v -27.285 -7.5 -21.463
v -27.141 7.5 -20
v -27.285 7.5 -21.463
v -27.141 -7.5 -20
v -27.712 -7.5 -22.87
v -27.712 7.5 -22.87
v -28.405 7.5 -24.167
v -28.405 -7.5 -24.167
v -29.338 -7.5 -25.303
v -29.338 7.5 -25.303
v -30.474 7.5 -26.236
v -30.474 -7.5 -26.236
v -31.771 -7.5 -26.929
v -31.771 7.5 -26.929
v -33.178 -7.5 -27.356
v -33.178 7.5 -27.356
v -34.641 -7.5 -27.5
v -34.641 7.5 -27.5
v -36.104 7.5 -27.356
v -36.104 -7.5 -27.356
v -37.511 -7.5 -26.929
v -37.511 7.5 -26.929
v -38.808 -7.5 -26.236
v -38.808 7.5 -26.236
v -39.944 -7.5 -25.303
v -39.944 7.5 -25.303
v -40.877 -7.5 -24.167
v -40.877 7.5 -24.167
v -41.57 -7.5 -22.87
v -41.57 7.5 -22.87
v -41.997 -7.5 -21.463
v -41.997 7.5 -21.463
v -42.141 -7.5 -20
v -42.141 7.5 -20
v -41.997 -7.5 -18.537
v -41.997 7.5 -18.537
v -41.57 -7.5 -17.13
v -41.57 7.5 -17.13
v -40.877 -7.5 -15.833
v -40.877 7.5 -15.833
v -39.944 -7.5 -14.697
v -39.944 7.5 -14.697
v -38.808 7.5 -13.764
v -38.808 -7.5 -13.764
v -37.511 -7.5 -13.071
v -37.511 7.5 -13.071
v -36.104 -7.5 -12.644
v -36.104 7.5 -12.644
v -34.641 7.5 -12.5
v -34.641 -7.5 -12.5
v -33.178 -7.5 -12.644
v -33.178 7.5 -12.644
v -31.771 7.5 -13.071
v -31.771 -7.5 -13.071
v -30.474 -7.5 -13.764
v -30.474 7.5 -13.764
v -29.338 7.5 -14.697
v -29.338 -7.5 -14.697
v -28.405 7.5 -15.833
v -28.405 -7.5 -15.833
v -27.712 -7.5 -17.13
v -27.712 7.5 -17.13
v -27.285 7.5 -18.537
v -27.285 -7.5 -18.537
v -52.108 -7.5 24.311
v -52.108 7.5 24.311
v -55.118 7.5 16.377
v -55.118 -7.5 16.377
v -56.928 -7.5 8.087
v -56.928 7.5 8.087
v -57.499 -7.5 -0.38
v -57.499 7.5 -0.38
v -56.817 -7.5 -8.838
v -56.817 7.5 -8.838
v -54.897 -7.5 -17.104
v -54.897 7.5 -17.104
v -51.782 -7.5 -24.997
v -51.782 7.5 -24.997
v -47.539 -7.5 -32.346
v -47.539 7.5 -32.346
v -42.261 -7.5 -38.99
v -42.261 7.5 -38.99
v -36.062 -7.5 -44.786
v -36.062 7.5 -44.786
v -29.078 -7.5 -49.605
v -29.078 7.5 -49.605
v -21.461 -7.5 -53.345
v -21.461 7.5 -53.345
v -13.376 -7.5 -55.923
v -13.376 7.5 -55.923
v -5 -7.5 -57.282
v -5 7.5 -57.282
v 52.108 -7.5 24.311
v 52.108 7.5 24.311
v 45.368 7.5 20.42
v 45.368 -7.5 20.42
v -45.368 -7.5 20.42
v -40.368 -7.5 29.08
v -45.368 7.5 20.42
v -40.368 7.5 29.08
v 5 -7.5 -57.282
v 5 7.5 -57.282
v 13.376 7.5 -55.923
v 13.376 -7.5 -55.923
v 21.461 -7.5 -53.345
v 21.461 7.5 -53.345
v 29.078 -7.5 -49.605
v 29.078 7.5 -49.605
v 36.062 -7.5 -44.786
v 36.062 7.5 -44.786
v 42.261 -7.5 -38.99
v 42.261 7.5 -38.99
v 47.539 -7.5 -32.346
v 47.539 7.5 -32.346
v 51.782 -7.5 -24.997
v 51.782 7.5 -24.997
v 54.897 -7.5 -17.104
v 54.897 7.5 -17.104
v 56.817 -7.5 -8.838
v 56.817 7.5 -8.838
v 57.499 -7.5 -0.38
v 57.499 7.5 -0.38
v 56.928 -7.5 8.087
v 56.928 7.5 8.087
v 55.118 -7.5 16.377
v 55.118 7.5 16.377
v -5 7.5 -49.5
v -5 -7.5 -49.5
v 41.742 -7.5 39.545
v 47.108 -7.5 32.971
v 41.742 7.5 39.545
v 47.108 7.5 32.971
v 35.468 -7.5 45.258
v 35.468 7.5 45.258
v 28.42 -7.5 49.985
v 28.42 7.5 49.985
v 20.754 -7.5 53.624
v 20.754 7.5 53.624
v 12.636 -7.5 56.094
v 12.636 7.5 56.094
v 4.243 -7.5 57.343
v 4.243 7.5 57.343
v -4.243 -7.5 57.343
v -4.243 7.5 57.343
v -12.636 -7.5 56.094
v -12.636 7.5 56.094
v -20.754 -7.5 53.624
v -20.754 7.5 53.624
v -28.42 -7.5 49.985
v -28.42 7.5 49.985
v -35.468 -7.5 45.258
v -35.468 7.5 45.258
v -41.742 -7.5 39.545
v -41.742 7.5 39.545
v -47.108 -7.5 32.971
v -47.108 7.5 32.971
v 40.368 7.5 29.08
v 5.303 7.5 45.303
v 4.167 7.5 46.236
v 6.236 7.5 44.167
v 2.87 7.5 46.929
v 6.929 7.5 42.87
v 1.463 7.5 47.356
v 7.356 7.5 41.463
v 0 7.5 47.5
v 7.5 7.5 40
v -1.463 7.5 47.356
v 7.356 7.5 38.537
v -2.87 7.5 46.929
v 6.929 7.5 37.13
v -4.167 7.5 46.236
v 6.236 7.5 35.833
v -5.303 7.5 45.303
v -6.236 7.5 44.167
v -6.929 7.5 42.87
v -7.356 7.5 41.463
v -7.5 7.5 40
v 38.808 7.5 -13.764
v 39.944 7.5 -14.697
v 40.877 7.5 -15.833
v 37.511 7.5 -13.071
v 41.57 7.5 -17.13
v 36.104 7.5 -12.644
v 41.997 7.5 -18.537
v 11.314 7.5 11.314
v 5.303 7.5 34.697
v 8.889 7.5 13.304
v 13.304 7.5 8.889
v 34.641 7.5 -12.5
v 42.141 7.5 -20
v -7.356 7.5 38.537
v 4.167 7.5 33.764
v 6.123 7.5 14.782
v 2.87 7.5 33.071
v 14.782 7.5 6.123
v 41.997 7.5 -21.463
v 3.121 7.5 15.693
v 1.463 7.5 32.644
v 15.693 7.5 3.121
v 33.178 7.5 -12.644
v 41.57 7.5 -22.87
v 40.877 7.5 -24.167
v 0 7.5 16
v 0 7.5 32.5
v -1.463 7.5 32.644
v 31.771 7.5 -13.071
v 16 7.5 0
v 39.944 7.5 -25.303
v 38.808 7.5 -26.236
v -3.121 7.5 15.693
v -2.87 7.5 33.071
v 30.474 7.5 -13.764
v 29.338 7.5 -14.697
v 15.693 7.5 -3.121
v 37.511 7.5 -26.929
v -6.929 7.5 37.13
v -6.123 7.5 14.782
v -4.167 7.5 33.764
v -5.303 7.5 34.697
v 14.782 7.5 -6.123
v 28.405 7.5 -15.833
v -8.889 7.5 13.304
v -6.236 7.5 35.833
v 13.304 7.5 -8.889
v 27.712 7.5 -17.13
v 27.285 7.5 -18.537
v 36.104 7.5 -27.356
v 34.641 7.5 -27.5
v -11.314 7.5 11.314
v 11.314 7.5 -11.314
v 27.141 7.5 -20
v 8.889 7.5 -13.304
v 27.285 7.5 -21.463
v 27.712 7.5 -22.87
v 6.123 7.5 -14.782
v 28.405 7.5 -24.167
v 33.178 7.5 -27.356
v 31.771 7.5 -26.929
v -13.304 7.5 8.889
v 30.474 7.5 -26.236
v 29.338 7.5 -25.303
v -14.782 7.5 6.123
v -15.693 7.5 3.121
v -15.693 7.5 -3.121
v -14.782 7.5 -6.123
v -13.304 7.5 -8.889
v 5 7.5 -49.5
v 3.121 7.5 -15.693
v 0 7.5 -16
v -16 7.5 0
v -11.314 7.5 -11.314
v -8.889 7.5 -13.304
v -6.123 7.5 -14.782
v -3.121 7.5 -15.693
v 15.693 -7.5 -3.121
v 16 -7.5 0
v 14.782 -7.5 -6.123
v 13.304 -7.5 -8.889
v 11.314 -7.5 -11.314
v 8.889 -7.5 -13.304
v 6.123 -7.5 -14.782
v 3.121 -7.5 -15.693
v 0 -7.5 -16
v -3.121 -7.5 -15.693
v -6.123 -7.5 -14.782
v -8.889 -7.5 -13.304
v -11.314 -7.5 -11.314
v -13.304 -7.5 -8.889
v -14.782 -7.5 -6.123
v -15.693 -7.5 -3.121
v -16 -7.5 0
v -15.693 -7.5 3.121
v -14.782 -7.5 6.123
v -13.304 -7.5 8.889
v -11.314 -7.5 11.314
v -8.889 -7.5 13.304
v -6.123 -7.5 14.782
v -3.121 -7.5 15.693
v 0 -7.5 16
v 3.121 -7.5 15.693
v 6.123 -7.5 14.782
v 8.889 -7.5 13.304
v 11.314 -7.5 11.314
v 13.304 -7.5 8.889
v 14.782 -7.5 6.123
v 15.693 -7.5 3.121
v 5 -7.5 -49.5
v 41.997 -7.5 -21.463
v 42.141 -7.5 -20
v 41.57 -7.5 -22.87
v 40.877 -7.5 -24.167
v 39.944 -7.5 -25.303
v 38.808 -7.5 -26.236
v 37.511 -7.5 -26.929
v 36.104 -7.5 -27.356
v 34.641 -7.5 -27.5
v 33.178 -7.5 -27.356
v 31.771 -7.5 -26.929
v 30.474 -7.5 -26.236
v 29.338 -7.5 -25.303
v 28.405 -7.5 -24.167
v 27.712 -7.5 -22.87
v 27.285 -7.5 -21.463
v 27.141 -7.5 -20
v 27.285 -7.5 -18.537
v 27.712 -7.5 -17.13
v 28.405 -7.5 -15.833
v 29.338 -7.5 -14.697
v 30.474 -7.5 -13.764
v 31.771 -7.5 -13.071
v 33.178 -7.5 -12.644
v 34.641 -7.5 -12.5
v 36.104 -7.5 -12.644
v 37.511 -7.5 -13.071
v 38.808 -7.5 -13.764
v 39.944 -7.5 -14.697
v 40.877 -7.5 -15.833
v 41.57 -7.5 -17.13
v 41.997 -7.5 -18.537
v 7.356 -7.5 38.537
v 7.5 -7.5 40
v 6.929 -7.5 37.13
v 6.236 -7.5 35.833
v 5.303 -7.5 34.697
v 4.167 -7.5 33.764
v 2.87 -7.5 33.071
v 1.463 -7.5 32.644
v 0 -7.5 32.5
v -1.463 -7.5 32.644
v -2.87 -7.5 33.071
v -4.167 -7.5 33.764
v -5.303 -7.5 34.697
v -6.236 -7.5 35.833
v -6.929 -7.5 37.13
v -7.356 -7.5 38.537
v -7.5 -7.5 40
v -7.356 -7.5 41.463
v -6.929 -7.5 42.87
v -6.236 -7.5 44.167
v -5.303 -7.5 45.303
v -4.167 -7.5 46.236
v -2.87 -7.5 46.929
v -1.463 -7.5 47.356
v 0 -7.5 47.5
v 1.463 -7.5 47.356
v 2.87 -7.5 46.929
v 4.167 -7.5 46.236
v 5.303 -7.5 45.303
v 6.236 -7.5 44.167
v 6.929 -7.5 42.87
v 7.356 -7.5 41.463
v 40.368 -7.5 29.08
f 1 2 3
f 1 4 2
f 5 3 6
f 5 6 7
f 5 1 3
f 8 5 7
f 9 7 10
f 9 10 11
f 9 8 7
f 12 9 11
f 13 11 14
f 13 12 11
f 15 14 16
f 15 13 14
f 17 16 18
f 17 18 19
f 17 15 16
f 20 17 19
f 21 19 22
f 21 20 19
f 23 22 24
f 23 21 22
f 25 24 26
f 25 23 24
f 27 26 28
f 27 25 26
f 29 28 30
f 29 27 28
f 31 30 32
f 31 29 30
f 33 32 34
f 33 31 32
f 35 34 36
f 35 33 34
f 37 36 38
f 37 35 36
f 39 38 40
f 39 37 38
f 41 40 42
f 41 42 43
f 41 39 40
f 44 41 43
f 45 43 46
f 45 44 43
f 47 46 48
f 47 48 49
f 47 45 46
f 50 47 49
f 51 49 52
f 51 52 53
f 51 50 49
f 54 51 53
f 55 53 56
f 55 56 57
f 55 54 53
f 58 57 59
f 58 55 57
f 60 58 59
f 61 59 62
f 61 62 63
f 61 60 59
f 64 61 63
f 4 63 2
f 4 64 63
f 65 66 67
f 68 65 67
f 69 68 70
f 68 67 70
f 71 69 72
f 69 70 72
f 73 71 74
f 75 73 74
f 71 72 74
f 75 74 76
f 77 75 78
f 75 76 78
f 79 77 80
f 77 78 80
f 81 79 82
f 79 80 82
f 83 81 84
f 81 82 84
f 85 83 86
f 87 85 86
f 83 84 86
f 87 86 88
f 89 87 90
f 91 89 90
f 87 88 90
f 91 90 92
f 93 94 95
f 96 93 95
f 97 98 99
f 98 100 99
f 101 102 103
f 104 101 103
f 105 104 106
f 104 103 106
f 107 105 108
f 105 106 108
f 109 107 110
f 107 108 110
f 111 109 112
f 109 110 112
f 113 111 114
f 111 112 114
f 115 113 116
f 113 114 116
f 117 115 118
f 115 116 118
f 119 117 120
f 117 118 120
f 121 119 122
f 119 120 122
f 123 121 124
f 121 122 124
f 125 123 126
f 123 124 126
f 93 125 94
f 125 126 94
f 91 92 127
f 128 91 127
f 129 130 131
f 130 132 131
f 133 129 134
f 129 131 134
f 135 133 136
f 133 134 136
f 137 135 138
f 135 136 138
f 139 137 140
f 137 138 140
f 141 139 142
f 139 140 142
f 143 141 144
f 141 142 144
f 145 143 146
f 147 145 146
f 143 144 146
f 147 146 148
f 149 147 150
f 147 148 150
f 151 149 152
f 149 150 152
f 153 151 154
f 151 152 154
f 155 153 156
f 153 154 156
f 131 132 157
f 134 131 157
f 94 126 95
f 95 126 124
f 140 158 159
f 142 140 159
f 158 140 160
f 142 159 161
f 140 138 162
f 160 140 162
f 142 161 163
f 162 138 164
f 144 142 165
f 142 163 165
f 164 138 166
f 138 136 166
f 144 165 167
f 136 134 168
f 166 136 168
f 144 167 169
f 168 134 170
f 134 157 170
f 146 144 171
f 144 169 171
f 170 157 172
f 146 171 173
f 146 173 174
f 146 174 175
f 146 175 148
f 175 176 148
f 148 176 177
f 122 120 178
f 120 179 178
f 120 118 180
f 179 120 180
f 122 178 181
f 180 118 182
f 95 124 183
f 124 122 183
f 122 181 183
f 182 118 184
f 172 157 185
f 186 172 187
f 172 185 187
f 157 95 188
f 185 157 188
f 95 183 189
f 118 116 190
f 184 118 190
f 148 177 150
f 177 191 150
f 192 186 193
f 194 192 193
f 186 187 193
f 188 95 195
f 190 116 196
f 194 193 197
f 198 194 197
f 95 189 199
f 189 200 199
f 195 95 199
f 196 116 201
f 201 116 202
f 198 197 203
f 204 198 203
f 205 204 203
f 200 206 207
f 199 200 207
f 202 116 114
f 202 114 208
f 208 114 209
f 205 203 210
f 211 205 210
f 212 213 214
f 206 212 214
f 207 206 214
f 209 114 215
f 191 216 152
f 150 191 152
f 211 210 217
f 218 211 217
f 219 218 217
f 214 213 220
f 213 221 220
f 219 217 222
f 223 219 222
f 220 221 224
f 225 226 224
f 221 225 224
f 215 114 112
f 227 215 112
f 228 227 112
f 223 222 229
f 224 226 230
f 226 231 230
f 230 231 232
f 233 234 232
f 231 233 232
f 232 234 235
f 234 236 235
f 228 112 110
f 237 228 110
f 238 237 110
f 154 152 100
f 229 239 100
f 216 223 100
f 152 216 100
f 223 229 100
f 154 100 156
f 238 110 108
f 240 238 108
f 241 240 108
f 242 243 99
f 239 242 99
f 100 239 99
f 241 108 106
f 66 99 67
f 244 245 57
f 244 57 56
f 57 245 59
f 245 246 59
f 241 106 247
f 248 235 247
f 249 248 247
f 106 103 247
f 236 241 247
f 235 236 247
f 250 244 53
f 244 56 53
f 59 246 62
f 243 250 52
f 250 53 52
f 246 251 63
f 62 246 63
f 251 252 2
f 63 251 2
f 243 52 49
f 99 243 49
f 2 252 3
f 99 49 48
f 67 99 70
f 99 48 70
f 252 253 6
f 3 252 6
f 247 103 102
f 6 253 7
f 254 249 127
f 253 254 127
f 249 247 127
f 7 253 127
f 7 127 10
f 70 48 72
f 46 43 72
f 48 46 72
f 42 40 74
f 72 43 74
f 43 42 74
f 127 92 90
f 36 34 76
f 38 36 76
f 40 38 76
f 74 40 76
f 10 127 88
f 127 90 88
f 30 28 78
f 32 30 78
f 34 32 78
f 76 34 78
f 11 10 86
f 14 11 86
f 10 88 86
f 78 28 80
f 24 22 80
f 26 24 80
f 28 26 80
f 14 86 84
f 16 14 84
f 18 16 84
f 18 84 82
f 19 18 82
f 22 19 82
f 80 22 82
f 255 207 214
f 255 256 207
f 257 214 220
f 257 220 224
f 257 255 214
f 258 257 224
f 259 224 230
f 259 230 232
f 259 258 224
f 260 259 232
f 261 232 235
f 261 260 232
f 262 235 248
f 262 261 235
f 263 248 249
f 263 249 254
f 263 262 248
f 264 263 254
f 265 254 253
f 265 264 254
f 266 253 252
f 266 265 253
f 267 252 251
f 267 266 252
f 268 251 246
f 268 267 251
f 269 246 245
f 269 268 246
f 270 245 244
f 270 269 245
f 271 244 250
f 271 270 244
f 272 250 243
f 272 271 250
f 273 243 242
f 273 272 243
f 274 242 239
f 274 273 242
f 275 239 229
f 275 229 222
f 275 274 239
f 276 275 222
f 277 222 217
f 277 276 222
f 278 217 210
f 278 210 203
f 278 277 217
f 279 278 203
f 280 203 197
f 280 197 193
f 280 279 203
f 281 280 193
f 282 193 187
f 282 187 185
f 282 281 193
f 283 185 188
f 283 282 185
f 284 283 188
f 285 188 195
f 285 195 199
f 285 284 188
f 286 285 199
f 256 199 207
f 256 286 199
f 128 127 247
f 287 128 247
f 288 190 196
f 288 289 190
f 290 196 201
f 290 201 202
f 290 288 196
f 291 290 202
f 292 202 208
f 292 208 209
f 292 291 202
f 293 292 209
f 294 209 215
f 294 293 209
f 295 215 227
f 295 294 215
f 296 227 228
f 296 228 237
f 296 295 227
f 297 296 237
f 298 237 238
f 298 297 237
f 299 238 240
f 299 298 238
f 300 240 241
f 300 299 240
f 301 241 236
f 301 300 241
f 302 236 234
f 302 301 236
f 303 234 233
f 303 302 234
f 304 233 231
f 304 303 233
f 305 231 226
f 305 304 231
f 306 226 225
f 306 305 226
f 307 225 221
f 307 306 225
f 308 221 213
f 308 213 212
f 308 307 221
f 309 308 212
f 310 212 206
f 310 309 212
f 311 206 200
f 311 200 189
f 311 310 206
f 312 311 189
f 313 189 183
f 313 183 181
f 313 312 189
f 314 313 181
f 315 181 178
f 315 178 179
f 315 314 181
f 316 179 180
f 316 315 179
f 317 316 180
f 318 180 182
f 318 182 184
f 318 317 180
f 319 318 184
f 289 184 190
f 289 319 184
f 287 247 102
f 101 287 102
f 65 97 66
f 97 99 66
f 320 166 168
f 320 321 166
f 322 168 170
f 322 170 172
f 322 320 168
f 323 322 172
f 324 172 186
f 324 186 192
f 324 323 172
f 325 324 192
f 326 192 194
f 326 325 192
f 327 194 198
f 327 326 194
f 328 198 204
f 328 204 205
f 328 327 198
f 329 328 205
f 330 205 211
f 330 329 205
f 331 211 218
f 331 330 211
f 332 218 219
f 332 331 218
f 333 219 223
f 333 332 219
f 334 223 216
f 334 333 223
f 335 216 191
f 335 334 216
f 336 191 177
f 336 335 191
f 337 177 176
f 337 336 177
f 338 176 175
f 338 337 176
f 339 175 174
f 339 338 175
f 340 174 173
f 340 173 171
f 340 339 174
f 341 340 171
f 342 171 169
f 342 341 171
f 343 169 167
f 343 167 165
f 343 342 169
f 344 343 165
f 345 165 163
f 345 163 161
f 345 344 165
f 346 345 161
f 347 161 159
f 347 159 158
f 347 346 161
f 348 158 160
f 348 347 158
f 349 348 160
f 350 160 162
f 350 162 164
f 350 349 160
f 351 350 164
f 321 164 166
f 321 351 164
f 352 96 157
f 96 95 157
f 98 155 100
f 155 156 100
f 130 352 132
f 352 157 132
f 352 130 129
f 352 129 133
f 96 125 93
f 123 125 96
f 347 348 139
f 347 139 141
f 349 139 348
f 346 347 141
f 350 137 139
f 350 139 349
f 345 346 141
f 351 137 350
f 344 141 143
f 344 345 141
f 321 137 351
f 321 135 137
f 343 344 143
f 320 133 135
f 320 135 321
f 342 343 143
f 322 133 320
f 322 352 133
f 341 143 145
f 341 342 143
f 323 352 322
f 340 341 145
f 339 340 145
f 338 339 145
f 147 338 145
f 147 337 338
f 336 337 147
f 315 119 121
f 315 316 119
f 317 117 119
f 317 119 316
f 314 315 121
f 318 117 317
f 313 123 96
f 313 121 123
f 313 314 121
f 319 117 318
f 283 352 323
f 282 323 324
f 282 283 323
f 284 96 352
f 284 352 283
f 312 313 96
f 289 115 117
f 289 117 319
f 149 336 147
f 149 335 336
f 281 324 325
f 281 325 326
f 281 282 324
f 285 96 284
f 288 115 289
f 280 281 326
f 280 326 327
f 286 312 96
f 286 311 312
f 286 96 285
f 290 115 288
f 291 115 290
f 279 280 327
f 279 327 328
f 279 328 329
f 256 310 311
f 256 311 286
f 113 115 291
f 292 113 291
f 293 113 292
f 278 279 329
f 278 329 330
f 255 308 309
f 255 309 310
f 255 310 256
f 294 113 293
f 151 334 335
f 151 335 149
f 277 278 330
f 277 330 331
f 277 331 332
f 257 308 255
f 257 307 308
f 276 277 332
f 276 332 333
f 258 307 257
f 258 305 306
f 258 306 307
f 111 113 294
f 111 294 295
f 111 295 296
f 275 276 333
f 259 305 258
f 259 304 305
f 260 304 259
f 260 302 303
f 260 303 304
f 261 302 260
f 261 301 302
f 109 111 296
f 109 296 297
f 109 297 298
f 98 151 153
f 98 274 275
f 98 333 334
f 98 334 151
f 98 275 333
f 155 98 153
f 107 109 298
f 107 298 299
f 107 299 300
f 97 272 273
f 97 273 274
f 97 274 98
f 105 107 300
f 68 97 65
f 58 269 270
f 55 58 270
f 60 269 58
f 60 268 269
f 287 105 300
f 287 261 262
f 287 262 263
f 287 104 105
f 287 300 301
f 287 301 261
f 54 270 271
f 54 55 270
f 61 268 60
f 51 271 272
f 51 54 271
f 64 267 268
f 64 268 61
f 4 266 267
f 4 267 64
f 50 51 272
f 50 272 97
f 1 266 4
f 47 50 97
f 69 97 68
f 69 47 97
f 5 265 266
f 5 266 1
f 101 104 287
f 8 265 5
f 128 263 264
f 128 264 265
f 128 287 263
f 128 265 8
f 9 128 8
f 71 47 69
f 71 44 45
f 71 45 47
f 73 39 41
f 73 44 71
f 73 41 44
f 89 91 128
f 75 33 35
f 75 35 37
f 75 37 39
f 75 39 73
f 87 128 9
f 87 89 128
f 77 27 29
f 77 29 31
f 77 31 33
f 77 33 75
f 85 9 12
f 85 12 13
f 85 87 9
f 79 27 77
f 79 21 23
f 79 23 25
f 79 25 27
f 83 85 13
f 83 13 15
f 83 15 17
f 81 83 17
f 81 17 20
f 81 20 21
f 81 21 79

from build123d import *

# Parameters (mm, degrees)
SKETCH1_R           = 16
SKETCH1_R_2         = 7.5
BOSS_EXTRUDE1_DEPTH = 7.5


with BuildPart() as part:
    # Sketch1 → Boss-Extrude1 (new body, symmetric)
    with BuildSketch(Plane(origin=(0, 0, 0), x_dir=(1, 0, 0), z_dir=(0, 1, 0))):
        with BuildLine():
            Line((52.107837082, -24.310971075), (45.368257487, -20.419872981))
            Line((45.368257487, -20.419872981), (40.368257487, -29.080127019))
            Line((40.368257487, -29.080127019), (47.107837082, -32.971225112))
            ThreePointArc((47.107837082, -32.971225112), (0, -57.5), (-47.107837082, -32.971225112))
            Line((-47.107837082, -32.971225112), (-40.368257487, -29.080127019))
            Line((-40.368257487, -29.080127019), (-45.368257487, -20.419872981))
            Line((-45.368257487, -20.419872981), (-52.107837082, -24.310971075))
            ThreePointArc((-52.107837082, -24.310971075), (-49.796460718, 28.75), (-5, 57.282196187))
            Line((-5, 57.282196187), (-5, 49.5))
            Line((-5, 49.5), (5, 49.5))
            Line((5, 49.5), (5, 57.282196187))
            ThreePointArc((5, 57.282196187), (49.796460718, 28.75), (52.107837082, -24.310971075))
        make_face()
        Circle(SKETCH1_R, mode=Mode.SUBTRACT)
        with Locations((0, -40)):
            Circle(SKETCH1_R_2, mode=Mode.SUBTRACT)
        with Locations((-34.641016151, 20)):
            Circle(SKETCH1_R_2, mode=Mode.SUBTRACT)
        with Locations((34.641016151, 20)):
            Circle(SKETCH1_R_2, mode=Mode.SUBTRACT)
    extrude(amount=BOSS_EXTRUDE1_DEPTH, both=True)


solid = part.part
